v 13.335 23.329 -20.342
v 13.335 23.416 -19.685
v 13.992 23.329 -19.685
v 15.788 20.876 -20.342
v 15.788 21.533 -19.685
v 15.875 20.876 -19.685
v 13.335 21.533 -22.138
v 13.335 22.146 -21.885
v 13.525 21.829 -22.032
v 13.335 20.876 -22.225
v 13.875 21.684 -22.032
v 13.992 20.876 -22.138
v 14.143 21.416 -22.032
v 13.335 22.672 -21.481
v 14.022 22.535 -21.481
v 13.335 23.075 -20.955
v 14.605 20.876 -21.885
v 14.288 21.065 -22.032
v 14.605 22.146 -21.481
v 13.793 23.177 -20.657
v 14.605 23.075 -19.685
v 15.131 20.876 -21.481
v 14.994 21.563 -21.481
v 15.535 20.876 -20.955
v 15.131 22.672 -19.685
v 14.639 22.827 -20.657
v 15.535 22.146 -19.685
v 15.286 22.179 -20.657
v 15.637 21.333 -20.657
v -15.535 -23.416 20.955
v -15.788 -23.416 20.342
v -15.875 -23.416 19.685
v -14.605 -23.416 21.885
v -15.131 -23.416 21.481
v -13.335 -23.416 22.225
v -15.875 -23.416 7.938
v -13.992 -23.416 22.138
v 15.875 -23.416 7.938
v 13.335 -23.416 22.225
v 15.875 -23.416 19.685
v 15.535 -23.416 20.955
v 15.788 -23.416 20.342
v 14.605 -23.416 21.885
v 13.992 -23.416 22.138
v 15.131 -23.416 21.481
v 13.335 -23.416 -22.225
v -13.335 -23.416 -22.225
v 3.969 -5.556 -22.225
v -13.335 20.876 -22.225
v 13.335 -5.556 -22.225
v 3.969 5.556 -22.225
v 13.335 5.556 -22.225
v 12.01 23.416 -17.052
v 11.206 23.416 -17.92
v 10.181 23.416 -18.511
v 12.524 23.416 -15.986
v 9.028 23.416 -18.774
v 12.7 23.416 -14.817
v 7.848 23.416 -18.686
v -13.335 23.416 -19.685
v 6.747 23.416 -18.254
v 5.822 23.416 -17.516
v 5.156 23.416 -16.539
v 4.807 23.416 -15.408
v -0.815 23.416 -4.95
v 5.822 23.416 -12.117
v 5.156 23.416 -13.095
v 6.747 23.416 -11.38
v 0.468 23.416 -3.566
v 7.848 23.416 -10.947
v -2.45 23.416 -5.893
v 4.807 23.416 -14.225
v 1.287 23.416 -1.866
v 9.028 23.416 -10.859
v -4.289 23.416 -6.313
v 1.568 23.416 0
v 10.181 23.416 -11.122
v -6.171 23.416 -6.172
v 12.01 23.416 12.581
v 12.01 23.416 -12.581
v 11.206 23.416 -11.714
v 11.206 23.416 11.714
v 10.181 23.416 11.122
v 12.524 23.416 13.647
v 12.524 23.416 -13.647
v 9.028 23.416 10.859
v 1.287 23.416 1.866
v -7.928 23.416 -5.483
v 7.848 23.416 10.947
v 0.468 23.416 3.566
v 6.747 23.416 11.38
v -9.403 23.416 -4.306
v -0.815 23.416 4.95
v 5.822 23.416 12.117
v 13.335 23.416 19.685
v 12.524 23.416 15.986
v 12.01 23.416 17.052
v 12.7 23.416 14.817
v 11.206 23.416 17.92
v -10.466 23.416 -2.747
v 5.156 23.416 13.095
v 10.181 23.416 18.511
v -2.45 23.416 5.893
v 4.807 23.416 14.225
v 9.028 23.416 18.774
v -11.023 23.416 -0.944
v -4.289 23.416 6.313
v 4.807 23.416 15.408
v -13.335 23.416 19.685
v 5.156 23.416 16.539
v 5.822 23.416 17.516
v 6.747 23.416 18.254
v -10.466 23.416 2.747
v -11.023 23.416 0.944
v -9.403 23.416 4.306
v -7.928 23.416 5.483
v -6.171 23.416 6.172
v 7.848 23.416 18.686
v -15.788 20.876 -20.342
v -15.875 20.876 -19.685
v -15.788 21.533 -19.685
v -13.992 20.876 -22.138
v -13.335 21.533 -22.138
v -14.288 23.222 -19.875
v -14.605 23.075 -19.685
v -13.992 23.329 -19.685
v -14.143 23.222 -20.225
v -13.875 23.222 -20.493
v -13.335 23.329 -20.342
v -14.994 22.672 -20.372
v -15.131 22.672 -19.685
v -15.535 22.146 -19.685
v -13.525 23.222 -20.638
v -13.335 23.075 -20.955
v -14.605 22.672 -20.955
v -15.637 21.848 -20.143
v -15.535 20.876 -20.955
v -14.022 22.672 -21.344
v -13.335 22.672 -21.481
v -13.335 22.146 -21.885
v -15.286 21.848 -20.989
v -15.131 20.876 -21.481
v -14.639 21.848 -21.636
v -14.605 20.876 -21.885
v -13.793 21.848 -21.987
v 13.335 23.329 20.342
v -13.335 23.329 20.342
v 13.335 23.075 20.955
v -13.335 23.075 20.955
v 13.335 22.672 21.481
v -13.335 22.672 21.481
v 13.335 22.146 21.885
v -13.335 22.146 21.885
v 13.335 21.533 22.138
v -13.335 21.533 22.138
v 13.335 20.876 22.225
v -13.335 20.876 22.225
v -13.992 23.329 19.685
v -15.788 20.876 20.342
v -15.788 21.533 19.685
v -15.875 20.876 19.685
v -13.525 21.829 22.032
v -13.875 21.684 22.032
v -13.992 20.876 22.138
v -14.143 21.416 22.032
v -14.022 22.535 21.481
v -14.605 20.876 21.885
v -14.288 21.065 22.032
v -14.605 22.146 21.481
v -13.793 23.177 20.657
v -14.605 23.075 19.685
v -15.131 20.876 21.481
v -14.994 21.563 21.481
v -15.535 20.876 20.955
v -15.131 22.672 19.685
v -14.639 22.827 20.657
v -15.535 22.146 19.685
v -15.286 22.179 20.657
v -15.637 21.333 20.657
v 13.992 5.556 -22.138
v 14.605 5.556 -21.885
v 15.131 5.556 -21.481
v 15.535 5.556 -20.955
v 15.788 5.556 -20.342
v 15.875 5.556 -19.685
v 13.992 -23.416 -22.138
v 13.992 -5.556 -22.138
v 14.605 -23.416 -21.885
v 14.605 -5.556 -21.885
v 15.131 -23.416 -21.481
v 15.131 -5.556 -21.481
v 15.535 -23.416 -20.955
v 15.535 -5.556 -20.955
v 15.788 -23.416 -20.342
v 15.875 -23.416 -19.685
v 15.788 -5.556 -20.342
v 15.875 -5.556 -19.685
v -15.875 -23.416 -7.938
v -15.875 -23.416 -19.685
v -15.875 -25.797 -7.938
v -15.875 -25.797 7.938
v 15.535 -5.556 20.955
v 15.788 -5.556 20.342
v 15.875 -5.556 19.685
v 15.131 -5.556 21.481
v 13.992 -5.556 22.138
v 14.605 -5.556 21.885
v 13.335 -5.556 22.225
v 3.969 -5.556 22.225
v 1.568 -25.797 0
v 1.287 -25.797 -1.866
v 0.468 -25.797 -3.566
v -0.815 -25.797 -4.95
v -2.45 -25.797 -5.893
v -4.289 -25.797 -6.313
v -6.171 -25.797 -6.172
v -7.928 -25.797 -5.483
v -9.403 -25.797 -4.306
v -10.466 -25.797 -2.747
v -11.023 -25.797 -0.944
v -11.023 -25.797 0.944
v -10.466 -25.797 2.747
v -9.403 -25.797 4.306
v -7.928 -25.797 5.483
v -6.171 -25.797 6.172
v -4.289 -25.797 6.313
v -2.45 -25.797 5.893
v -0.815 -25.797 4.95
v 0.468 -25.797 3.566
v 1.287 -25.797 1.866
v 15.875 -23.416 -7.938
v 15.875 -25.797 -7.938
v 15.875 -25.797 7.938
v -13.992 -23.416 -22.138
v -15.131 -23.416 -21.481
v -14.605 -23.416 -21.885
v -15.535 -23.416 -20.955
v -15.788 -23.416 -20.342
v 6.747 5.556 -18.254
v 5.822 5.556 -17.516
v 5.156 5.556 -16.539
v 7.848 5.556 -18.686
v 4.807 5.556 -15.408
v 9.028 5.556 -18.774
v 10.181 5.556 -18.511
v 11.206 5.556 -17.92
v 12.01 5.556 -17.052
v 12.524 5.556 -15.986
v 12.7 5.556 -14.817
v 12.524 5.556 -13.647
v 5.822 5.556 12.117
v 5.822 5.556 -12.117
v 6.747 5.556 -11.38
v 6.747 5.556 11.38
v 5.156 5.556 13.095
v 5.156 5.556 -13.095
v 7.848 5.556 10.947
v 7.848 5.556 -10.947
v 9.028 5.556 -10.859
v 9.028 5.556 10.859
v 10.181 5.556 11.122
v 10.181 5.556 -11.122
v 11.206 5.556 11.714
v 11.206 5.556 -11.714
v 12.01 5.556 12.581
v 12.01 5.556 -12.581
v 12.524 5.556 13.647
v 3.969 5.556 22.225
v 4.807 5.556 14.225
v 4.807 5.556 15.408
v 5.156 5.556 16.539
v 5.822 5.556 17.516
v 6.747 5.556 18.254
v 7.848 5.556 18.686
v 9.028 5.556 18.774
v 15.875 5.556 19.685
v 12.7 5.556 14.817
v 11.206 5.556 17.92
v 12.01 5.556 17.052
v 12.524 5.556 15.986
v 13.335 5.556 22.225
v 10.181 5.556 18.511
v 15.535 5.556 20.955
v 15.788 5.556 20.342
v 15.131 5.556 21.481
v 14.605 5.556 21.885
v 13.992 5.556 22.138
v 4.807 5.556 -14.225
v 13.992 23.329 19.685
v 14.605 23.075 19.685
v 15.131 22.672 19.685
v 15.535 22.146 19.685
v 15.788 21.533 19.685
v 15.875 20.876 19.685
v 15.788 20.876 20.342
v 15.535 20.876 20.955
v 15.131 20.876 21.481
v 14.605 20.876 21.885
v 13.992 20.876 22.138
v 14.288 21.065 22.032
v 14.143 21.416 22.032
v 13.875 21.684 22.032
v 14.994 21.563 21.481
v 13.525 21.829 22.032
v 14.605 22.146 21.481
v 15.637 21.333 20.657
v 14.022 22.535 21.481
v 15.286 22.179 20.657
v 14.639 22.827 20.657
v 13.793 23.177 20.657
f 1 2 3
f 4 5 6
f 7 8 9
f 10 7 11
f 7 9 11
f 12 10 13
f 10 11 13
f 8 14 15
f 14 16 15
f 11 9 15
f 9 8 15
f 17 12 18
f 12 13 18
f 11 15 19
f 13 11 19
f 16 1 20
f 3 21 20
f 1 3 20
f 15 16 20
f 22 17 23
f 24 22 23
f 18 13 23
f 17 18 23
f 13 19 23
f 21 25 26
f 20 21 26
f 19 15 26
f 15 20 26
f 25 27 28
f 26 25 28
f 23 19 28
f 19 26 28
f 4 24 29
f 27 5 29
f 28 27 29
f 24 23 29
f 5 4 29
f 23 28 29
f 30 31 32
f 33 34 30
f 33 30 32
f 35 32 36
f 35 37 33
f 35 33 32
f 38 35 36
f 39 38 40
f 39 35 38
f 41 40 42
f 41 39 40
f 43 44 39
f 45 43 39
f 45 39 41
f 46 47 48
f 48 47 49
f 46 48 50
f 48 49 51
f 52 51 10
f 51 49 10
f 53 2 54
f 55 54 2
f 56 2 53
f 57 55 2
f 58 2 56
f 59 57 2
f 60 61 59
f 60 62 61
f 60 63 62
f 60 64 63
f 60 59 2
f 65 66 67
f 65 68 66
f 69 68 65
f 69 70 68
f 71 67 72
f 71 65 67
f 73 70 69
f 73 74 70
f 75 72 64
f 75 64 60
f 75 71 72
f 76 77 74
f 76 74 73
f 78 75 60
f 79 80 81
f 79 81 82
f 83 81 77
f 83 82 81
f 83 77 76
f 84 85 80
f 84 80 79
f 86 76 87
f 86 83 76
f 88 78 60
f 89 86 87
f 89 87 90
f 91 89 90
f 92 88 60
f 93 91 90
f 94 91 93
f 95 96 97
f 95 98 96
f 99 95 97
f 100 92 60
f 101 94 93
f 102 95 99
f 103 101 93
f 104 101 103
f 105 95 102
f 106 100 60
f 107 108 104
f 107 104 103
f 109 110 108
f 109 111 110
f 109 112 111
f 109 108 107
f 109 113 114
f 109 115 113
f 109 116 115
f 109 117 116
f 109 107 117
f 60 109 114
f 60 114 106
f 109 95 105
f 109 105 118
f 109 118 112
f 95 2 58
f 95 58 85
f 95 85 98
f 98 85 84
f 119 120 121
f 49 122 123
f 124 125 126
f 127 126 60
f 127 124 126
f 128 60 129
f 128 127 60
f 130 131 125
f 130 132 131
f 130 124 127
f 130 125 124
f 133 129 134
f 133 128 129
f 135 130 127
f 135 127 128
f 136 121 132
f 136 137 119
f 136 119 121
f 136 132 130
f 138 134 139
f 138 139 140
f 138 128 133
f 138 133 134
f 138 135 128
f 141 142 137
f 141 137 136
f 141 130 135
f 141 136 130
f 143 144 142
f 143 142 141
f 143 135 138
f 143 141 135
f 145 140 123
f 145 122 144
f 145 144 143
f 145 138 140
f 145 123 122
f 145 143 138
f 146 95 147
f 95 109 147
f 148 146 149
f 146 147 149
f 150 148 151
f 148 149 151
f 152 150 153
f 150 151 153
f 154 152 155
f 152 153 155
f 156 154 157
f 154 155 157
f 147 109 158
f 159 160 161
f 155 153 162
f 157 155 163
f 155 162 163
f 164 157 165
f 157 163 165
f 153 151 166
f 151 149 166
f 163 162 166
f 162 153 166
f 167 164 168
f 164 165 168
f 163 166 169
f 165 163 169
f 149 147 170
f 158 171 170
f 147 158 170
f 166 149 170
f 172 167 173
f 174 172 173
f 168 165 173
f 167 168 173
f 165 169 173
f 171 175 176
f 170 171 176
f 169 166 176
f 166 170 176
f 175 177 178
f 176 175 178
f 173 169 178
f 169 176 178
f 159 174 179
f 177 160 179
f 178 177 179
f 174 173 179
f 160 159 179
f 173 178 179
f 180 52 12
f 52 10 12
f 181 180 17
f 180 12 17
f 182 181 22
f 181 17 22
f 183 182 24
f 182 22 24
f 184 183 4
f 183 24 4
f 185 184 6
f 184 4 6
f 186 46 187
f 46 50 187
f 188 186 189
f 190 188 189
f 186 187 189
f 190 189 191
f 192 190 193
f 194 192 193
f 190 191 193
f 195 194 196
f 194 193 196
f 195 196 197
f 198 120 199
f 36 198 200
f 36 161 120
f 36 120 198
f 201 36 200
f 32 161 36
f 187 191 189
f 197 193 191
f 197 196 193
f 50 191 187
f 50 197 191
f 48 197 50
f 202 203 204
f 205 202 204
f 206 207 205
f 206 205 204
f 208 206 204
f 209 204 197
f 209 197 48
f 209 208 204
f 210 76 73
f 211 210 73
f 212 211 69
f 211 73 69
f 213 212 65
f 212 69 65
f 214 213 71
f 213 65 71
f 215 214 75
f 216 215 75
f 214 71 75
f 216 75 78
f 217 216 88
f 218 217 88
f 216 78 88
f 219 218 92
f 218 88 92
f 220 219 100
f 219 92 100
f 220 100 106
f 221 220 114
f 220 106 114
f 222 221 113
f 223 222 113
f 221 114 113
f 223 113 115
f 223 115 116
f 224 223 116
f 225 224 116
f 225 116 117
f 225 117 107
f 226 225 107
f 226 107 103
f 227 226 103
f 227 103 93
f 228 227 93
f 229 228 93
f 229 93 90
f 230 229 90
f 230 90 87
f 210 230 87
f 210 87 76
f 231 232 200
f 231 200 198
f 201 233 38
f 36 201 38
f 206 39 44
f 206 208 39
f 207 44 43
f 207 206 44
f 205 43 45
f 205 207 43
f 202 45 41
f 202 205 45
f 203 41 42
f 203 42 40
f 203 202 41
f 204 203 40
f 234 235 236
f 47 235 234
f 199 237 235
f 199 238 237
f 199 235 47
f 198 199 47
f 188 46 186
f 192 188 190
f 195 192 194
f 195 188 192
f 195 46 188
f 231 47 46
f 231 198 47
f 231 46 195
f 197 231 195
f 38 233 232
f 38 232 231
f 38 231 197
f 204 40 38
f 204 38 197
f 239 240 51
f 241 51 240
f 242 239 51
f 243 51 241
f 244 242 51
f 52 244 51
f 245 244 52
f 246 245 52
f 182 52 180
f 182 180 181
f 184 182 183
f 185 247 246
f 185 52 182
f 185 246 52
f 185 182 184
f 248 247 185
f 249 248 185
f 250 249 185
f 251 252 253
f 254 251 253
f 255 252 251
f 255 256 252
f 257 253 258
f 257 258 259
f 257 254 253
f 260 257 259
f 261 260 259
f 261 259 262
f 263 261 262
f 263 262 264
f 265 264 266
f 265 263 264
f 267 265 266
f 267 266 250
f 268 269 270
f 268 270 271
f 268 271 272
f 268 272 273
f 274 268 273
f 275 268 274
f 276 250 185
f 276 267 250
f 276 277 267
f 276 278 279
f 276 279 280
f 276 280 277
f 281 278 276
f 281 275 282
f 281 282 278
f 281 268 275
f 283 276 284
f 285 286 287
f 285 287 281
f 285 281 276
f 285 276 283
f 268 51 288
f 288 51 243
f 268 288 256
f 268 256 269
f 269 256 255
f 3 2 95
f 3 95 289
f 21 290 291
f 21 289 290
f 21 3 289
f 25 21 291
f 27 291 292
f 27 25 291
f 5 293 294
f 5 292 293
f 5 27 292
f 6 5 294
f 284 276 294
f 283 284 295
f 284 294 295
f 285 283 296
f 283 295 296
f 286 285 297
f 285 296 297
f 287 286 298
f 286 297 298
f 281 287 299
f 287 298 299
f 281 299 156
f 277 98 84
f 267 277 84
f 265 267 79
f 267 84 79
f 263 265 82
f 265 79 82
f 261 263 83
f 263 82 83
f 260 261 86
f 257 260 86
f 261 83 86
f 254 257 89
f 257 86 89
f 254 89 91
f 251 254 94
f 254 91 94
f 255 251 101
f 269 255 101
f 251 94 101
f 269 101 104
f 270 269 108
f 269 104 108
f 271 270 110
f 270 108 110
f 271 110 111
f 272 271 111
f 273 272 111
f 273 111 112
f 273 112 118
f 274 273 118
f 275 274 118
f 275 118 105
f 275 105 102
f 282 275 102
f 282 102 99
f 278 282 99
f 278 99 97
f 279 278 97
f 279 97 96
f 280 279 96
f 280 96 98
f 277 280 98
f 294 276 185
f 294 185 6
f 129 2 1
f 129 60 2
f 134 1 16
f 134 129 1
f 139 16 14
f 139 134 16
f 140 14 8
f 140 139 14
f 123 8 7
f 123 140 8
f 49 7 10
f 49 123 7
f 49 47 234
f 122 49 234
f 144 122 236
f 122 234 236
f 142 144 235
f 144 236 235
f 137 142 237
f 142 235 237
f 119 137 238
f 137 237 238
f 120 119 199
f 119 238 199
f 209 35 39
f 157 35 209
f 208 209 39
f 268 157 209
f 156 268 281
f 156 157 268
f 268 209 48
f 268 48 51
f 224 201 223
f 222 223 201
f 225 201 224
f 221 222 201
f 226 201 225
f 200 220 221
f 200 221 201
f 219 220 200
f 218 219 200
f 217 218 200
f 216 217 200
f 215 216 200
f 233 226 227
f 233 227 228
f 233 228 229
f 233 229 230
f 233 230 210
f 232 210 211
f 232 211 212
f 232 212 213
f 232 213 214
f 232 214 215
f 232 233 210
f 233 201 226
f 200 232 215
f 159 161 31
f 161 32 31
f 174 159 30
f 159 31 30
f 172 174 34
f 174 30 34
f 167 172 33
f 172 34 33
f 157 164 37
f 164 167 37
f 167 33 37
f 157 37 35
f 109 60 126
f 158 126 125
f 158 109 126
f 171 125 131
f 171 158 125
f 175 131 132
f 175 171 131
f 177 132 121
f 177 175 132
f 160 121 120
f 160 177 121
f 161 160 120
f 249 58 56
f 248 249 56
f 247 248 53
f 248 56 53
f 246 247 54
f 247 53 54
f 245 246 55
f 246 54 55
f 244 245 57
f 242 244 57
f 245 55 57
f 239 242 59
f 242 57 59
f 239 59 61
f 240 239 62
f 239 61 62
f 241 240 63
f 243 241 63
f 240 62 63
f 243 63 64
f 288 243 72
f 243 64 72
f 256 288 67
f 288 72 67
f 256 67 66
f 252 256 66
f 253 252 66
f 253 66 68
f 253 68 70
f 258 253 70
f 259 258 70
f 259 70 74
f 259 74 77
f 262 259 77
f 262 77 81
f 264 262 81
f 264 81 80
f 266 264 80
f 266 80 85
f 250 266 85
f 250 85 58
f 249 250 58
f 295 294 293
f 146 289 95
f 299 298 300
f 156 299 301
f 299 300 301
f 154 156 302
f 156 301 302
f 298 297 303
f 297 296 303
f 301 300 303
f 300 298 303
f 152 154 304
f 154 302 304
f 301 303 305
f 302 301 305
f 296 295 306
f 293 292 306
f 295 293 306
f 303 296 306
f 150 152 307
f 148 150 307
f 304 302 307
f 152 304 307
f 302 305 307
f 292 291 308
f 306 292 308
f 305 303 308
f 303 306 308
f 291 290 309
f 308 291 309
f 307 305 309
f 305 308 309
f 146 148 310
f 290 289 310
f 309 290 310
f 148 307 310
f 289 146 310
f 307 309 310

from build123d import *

# Parameters (mm, degrees)
BOSS_EXTRUDE1_DEPTH     = 22.225
SKETCH4_W               = 15.875
SKETCH4_H               = 2.38125
BOSS_EXTRUDE2_DEPTH     = 31.75
SKETCH2_R               = 6.33095
CUT_EXTRUDE1_DEPTH      = 1
CUT_EXTRUDE1_DEPTH_BACK = 50.2125
CUT_EXTRUDE2_REACH      = 51.212
SKETCH3_R               = 3.96875
FILLET1_R               = 2.54


with BuildPart() as part:
    # Sketch1 → Boss-Extrude1 (new body, symmetric)
    with BuildSketch(Plane.XY):
        Polygon((15.875, 23.415625), (-15.875, 23.415625), (-15.875, -23.415625), (15.875, -23.415625), (15.875, -5.55625), (3.96875, -5.55625), (3.96875, 5.55625), (15.875, 5.55625), align=None)
    extrude(amount=BOSS_EXTRUDE1_DEPTH, both=True)

    # Sketch4 → Boss-Extrude2 (add, through all)
    with BuildSketch(Plane(origin=(15.875, 0, 0), x_dir=(0, 0, -1), z_dir=(1, 0, 0))):
        with Locations((0, -24.60625)):
            Rectangle(SKETCH4_W, SKETCH4_H)
    extrude(amount=-BOSS_EXTRUDE2_DEPTH)

    # Sketch2 → Cut-Extrude1 (cut, two sides)
    with BuildSketch(Plane(origin=(0, 23.415625, 0), x_dir=(1, 0, 0), z_dir=(0, 1, 0))) as cut_extrude1_sk:
        with Locations((-4.7625, 0)):
            Circle(SKETCH2_R)
    extrude(amount=CUT_EXTRUDE1_DEPTH, mode=Mode.SUBTRACT)
    extrude(cut_extrude1_sk.sketch, amount=-CUT_EXTRUDE1_DEPTH_BACK, mode=Mode.SUBTRACT)

    # Sketch3 → Cut-Extrude2 (cut, up to next)
    with BuildSketch(Plane(origin=(0, 23.415625, 0), x_dir=(1, 0, 0), z_dir=(0, 1, 0)), mode=Mode.PRIVATE) as cut_extrude2_sk1:
        with Locations((8.73125, 14.816666667)):
            Circle(SKETCH3_R)
    cut_extrude2_tool1 = extrude(cut_extrude2_sk1.sketch, amount=-CUT_EXTRUDE2_REACH, mode=Mode.PRIVATE) & part.part
    add(cut_extrude2_tool1.solids().sort_by_distance((8.73125, 23.415625, -14.816667))[0], mode=Mode.SUBTRACT)
    # Sketch3 → Cut-Extrude2 (cut, up to next)
    with BuildSketch(Plane(origin=(0, 23.415625, 0), x_dir=(1, 0, 0), z_dir=(0, 1, 0)), mode=Mode.PRIVATE) as cut_extrude2_sk2:
        with Locations((8.73125, -14.816666667)):
            Circle(SKETCH3_R)
    cut_extrude2_tool2 = extrude(cut_extrude2_sk2.sketch, amount=-CUT_EXTRUDE2_REACH, mode=Mode.PRIVATE) & part.part
    add(cut_extrude2_tool2.solids().sort_by_distance((8.73125, 23.415625, 14.816667))[0], mode=Mode.SUBTRACT)

    # Fillet1
    fillet1_edges = [part.edges().sort_by_distance(p)[0] for p in [
        (15.875, -14.4859375, 22.225),
        (-15.875, 0, -22.225),
        (-15.875, 23.415625, 0),
        (15.875, 23.415625, 0),
        (15.875, 14.4859375, 22.225),
        (0, 23.415625, 22.225),
        (-15.875, 0, 22.225),
        (0, 23.415625, -22.225),
        (15.875, 14.4859375, -22.225),
        (15.875, -14.4859375, -22.225),
    ]]
    fillet(fillet1_edges, radius=FILLET1_R)


solid = part.part
